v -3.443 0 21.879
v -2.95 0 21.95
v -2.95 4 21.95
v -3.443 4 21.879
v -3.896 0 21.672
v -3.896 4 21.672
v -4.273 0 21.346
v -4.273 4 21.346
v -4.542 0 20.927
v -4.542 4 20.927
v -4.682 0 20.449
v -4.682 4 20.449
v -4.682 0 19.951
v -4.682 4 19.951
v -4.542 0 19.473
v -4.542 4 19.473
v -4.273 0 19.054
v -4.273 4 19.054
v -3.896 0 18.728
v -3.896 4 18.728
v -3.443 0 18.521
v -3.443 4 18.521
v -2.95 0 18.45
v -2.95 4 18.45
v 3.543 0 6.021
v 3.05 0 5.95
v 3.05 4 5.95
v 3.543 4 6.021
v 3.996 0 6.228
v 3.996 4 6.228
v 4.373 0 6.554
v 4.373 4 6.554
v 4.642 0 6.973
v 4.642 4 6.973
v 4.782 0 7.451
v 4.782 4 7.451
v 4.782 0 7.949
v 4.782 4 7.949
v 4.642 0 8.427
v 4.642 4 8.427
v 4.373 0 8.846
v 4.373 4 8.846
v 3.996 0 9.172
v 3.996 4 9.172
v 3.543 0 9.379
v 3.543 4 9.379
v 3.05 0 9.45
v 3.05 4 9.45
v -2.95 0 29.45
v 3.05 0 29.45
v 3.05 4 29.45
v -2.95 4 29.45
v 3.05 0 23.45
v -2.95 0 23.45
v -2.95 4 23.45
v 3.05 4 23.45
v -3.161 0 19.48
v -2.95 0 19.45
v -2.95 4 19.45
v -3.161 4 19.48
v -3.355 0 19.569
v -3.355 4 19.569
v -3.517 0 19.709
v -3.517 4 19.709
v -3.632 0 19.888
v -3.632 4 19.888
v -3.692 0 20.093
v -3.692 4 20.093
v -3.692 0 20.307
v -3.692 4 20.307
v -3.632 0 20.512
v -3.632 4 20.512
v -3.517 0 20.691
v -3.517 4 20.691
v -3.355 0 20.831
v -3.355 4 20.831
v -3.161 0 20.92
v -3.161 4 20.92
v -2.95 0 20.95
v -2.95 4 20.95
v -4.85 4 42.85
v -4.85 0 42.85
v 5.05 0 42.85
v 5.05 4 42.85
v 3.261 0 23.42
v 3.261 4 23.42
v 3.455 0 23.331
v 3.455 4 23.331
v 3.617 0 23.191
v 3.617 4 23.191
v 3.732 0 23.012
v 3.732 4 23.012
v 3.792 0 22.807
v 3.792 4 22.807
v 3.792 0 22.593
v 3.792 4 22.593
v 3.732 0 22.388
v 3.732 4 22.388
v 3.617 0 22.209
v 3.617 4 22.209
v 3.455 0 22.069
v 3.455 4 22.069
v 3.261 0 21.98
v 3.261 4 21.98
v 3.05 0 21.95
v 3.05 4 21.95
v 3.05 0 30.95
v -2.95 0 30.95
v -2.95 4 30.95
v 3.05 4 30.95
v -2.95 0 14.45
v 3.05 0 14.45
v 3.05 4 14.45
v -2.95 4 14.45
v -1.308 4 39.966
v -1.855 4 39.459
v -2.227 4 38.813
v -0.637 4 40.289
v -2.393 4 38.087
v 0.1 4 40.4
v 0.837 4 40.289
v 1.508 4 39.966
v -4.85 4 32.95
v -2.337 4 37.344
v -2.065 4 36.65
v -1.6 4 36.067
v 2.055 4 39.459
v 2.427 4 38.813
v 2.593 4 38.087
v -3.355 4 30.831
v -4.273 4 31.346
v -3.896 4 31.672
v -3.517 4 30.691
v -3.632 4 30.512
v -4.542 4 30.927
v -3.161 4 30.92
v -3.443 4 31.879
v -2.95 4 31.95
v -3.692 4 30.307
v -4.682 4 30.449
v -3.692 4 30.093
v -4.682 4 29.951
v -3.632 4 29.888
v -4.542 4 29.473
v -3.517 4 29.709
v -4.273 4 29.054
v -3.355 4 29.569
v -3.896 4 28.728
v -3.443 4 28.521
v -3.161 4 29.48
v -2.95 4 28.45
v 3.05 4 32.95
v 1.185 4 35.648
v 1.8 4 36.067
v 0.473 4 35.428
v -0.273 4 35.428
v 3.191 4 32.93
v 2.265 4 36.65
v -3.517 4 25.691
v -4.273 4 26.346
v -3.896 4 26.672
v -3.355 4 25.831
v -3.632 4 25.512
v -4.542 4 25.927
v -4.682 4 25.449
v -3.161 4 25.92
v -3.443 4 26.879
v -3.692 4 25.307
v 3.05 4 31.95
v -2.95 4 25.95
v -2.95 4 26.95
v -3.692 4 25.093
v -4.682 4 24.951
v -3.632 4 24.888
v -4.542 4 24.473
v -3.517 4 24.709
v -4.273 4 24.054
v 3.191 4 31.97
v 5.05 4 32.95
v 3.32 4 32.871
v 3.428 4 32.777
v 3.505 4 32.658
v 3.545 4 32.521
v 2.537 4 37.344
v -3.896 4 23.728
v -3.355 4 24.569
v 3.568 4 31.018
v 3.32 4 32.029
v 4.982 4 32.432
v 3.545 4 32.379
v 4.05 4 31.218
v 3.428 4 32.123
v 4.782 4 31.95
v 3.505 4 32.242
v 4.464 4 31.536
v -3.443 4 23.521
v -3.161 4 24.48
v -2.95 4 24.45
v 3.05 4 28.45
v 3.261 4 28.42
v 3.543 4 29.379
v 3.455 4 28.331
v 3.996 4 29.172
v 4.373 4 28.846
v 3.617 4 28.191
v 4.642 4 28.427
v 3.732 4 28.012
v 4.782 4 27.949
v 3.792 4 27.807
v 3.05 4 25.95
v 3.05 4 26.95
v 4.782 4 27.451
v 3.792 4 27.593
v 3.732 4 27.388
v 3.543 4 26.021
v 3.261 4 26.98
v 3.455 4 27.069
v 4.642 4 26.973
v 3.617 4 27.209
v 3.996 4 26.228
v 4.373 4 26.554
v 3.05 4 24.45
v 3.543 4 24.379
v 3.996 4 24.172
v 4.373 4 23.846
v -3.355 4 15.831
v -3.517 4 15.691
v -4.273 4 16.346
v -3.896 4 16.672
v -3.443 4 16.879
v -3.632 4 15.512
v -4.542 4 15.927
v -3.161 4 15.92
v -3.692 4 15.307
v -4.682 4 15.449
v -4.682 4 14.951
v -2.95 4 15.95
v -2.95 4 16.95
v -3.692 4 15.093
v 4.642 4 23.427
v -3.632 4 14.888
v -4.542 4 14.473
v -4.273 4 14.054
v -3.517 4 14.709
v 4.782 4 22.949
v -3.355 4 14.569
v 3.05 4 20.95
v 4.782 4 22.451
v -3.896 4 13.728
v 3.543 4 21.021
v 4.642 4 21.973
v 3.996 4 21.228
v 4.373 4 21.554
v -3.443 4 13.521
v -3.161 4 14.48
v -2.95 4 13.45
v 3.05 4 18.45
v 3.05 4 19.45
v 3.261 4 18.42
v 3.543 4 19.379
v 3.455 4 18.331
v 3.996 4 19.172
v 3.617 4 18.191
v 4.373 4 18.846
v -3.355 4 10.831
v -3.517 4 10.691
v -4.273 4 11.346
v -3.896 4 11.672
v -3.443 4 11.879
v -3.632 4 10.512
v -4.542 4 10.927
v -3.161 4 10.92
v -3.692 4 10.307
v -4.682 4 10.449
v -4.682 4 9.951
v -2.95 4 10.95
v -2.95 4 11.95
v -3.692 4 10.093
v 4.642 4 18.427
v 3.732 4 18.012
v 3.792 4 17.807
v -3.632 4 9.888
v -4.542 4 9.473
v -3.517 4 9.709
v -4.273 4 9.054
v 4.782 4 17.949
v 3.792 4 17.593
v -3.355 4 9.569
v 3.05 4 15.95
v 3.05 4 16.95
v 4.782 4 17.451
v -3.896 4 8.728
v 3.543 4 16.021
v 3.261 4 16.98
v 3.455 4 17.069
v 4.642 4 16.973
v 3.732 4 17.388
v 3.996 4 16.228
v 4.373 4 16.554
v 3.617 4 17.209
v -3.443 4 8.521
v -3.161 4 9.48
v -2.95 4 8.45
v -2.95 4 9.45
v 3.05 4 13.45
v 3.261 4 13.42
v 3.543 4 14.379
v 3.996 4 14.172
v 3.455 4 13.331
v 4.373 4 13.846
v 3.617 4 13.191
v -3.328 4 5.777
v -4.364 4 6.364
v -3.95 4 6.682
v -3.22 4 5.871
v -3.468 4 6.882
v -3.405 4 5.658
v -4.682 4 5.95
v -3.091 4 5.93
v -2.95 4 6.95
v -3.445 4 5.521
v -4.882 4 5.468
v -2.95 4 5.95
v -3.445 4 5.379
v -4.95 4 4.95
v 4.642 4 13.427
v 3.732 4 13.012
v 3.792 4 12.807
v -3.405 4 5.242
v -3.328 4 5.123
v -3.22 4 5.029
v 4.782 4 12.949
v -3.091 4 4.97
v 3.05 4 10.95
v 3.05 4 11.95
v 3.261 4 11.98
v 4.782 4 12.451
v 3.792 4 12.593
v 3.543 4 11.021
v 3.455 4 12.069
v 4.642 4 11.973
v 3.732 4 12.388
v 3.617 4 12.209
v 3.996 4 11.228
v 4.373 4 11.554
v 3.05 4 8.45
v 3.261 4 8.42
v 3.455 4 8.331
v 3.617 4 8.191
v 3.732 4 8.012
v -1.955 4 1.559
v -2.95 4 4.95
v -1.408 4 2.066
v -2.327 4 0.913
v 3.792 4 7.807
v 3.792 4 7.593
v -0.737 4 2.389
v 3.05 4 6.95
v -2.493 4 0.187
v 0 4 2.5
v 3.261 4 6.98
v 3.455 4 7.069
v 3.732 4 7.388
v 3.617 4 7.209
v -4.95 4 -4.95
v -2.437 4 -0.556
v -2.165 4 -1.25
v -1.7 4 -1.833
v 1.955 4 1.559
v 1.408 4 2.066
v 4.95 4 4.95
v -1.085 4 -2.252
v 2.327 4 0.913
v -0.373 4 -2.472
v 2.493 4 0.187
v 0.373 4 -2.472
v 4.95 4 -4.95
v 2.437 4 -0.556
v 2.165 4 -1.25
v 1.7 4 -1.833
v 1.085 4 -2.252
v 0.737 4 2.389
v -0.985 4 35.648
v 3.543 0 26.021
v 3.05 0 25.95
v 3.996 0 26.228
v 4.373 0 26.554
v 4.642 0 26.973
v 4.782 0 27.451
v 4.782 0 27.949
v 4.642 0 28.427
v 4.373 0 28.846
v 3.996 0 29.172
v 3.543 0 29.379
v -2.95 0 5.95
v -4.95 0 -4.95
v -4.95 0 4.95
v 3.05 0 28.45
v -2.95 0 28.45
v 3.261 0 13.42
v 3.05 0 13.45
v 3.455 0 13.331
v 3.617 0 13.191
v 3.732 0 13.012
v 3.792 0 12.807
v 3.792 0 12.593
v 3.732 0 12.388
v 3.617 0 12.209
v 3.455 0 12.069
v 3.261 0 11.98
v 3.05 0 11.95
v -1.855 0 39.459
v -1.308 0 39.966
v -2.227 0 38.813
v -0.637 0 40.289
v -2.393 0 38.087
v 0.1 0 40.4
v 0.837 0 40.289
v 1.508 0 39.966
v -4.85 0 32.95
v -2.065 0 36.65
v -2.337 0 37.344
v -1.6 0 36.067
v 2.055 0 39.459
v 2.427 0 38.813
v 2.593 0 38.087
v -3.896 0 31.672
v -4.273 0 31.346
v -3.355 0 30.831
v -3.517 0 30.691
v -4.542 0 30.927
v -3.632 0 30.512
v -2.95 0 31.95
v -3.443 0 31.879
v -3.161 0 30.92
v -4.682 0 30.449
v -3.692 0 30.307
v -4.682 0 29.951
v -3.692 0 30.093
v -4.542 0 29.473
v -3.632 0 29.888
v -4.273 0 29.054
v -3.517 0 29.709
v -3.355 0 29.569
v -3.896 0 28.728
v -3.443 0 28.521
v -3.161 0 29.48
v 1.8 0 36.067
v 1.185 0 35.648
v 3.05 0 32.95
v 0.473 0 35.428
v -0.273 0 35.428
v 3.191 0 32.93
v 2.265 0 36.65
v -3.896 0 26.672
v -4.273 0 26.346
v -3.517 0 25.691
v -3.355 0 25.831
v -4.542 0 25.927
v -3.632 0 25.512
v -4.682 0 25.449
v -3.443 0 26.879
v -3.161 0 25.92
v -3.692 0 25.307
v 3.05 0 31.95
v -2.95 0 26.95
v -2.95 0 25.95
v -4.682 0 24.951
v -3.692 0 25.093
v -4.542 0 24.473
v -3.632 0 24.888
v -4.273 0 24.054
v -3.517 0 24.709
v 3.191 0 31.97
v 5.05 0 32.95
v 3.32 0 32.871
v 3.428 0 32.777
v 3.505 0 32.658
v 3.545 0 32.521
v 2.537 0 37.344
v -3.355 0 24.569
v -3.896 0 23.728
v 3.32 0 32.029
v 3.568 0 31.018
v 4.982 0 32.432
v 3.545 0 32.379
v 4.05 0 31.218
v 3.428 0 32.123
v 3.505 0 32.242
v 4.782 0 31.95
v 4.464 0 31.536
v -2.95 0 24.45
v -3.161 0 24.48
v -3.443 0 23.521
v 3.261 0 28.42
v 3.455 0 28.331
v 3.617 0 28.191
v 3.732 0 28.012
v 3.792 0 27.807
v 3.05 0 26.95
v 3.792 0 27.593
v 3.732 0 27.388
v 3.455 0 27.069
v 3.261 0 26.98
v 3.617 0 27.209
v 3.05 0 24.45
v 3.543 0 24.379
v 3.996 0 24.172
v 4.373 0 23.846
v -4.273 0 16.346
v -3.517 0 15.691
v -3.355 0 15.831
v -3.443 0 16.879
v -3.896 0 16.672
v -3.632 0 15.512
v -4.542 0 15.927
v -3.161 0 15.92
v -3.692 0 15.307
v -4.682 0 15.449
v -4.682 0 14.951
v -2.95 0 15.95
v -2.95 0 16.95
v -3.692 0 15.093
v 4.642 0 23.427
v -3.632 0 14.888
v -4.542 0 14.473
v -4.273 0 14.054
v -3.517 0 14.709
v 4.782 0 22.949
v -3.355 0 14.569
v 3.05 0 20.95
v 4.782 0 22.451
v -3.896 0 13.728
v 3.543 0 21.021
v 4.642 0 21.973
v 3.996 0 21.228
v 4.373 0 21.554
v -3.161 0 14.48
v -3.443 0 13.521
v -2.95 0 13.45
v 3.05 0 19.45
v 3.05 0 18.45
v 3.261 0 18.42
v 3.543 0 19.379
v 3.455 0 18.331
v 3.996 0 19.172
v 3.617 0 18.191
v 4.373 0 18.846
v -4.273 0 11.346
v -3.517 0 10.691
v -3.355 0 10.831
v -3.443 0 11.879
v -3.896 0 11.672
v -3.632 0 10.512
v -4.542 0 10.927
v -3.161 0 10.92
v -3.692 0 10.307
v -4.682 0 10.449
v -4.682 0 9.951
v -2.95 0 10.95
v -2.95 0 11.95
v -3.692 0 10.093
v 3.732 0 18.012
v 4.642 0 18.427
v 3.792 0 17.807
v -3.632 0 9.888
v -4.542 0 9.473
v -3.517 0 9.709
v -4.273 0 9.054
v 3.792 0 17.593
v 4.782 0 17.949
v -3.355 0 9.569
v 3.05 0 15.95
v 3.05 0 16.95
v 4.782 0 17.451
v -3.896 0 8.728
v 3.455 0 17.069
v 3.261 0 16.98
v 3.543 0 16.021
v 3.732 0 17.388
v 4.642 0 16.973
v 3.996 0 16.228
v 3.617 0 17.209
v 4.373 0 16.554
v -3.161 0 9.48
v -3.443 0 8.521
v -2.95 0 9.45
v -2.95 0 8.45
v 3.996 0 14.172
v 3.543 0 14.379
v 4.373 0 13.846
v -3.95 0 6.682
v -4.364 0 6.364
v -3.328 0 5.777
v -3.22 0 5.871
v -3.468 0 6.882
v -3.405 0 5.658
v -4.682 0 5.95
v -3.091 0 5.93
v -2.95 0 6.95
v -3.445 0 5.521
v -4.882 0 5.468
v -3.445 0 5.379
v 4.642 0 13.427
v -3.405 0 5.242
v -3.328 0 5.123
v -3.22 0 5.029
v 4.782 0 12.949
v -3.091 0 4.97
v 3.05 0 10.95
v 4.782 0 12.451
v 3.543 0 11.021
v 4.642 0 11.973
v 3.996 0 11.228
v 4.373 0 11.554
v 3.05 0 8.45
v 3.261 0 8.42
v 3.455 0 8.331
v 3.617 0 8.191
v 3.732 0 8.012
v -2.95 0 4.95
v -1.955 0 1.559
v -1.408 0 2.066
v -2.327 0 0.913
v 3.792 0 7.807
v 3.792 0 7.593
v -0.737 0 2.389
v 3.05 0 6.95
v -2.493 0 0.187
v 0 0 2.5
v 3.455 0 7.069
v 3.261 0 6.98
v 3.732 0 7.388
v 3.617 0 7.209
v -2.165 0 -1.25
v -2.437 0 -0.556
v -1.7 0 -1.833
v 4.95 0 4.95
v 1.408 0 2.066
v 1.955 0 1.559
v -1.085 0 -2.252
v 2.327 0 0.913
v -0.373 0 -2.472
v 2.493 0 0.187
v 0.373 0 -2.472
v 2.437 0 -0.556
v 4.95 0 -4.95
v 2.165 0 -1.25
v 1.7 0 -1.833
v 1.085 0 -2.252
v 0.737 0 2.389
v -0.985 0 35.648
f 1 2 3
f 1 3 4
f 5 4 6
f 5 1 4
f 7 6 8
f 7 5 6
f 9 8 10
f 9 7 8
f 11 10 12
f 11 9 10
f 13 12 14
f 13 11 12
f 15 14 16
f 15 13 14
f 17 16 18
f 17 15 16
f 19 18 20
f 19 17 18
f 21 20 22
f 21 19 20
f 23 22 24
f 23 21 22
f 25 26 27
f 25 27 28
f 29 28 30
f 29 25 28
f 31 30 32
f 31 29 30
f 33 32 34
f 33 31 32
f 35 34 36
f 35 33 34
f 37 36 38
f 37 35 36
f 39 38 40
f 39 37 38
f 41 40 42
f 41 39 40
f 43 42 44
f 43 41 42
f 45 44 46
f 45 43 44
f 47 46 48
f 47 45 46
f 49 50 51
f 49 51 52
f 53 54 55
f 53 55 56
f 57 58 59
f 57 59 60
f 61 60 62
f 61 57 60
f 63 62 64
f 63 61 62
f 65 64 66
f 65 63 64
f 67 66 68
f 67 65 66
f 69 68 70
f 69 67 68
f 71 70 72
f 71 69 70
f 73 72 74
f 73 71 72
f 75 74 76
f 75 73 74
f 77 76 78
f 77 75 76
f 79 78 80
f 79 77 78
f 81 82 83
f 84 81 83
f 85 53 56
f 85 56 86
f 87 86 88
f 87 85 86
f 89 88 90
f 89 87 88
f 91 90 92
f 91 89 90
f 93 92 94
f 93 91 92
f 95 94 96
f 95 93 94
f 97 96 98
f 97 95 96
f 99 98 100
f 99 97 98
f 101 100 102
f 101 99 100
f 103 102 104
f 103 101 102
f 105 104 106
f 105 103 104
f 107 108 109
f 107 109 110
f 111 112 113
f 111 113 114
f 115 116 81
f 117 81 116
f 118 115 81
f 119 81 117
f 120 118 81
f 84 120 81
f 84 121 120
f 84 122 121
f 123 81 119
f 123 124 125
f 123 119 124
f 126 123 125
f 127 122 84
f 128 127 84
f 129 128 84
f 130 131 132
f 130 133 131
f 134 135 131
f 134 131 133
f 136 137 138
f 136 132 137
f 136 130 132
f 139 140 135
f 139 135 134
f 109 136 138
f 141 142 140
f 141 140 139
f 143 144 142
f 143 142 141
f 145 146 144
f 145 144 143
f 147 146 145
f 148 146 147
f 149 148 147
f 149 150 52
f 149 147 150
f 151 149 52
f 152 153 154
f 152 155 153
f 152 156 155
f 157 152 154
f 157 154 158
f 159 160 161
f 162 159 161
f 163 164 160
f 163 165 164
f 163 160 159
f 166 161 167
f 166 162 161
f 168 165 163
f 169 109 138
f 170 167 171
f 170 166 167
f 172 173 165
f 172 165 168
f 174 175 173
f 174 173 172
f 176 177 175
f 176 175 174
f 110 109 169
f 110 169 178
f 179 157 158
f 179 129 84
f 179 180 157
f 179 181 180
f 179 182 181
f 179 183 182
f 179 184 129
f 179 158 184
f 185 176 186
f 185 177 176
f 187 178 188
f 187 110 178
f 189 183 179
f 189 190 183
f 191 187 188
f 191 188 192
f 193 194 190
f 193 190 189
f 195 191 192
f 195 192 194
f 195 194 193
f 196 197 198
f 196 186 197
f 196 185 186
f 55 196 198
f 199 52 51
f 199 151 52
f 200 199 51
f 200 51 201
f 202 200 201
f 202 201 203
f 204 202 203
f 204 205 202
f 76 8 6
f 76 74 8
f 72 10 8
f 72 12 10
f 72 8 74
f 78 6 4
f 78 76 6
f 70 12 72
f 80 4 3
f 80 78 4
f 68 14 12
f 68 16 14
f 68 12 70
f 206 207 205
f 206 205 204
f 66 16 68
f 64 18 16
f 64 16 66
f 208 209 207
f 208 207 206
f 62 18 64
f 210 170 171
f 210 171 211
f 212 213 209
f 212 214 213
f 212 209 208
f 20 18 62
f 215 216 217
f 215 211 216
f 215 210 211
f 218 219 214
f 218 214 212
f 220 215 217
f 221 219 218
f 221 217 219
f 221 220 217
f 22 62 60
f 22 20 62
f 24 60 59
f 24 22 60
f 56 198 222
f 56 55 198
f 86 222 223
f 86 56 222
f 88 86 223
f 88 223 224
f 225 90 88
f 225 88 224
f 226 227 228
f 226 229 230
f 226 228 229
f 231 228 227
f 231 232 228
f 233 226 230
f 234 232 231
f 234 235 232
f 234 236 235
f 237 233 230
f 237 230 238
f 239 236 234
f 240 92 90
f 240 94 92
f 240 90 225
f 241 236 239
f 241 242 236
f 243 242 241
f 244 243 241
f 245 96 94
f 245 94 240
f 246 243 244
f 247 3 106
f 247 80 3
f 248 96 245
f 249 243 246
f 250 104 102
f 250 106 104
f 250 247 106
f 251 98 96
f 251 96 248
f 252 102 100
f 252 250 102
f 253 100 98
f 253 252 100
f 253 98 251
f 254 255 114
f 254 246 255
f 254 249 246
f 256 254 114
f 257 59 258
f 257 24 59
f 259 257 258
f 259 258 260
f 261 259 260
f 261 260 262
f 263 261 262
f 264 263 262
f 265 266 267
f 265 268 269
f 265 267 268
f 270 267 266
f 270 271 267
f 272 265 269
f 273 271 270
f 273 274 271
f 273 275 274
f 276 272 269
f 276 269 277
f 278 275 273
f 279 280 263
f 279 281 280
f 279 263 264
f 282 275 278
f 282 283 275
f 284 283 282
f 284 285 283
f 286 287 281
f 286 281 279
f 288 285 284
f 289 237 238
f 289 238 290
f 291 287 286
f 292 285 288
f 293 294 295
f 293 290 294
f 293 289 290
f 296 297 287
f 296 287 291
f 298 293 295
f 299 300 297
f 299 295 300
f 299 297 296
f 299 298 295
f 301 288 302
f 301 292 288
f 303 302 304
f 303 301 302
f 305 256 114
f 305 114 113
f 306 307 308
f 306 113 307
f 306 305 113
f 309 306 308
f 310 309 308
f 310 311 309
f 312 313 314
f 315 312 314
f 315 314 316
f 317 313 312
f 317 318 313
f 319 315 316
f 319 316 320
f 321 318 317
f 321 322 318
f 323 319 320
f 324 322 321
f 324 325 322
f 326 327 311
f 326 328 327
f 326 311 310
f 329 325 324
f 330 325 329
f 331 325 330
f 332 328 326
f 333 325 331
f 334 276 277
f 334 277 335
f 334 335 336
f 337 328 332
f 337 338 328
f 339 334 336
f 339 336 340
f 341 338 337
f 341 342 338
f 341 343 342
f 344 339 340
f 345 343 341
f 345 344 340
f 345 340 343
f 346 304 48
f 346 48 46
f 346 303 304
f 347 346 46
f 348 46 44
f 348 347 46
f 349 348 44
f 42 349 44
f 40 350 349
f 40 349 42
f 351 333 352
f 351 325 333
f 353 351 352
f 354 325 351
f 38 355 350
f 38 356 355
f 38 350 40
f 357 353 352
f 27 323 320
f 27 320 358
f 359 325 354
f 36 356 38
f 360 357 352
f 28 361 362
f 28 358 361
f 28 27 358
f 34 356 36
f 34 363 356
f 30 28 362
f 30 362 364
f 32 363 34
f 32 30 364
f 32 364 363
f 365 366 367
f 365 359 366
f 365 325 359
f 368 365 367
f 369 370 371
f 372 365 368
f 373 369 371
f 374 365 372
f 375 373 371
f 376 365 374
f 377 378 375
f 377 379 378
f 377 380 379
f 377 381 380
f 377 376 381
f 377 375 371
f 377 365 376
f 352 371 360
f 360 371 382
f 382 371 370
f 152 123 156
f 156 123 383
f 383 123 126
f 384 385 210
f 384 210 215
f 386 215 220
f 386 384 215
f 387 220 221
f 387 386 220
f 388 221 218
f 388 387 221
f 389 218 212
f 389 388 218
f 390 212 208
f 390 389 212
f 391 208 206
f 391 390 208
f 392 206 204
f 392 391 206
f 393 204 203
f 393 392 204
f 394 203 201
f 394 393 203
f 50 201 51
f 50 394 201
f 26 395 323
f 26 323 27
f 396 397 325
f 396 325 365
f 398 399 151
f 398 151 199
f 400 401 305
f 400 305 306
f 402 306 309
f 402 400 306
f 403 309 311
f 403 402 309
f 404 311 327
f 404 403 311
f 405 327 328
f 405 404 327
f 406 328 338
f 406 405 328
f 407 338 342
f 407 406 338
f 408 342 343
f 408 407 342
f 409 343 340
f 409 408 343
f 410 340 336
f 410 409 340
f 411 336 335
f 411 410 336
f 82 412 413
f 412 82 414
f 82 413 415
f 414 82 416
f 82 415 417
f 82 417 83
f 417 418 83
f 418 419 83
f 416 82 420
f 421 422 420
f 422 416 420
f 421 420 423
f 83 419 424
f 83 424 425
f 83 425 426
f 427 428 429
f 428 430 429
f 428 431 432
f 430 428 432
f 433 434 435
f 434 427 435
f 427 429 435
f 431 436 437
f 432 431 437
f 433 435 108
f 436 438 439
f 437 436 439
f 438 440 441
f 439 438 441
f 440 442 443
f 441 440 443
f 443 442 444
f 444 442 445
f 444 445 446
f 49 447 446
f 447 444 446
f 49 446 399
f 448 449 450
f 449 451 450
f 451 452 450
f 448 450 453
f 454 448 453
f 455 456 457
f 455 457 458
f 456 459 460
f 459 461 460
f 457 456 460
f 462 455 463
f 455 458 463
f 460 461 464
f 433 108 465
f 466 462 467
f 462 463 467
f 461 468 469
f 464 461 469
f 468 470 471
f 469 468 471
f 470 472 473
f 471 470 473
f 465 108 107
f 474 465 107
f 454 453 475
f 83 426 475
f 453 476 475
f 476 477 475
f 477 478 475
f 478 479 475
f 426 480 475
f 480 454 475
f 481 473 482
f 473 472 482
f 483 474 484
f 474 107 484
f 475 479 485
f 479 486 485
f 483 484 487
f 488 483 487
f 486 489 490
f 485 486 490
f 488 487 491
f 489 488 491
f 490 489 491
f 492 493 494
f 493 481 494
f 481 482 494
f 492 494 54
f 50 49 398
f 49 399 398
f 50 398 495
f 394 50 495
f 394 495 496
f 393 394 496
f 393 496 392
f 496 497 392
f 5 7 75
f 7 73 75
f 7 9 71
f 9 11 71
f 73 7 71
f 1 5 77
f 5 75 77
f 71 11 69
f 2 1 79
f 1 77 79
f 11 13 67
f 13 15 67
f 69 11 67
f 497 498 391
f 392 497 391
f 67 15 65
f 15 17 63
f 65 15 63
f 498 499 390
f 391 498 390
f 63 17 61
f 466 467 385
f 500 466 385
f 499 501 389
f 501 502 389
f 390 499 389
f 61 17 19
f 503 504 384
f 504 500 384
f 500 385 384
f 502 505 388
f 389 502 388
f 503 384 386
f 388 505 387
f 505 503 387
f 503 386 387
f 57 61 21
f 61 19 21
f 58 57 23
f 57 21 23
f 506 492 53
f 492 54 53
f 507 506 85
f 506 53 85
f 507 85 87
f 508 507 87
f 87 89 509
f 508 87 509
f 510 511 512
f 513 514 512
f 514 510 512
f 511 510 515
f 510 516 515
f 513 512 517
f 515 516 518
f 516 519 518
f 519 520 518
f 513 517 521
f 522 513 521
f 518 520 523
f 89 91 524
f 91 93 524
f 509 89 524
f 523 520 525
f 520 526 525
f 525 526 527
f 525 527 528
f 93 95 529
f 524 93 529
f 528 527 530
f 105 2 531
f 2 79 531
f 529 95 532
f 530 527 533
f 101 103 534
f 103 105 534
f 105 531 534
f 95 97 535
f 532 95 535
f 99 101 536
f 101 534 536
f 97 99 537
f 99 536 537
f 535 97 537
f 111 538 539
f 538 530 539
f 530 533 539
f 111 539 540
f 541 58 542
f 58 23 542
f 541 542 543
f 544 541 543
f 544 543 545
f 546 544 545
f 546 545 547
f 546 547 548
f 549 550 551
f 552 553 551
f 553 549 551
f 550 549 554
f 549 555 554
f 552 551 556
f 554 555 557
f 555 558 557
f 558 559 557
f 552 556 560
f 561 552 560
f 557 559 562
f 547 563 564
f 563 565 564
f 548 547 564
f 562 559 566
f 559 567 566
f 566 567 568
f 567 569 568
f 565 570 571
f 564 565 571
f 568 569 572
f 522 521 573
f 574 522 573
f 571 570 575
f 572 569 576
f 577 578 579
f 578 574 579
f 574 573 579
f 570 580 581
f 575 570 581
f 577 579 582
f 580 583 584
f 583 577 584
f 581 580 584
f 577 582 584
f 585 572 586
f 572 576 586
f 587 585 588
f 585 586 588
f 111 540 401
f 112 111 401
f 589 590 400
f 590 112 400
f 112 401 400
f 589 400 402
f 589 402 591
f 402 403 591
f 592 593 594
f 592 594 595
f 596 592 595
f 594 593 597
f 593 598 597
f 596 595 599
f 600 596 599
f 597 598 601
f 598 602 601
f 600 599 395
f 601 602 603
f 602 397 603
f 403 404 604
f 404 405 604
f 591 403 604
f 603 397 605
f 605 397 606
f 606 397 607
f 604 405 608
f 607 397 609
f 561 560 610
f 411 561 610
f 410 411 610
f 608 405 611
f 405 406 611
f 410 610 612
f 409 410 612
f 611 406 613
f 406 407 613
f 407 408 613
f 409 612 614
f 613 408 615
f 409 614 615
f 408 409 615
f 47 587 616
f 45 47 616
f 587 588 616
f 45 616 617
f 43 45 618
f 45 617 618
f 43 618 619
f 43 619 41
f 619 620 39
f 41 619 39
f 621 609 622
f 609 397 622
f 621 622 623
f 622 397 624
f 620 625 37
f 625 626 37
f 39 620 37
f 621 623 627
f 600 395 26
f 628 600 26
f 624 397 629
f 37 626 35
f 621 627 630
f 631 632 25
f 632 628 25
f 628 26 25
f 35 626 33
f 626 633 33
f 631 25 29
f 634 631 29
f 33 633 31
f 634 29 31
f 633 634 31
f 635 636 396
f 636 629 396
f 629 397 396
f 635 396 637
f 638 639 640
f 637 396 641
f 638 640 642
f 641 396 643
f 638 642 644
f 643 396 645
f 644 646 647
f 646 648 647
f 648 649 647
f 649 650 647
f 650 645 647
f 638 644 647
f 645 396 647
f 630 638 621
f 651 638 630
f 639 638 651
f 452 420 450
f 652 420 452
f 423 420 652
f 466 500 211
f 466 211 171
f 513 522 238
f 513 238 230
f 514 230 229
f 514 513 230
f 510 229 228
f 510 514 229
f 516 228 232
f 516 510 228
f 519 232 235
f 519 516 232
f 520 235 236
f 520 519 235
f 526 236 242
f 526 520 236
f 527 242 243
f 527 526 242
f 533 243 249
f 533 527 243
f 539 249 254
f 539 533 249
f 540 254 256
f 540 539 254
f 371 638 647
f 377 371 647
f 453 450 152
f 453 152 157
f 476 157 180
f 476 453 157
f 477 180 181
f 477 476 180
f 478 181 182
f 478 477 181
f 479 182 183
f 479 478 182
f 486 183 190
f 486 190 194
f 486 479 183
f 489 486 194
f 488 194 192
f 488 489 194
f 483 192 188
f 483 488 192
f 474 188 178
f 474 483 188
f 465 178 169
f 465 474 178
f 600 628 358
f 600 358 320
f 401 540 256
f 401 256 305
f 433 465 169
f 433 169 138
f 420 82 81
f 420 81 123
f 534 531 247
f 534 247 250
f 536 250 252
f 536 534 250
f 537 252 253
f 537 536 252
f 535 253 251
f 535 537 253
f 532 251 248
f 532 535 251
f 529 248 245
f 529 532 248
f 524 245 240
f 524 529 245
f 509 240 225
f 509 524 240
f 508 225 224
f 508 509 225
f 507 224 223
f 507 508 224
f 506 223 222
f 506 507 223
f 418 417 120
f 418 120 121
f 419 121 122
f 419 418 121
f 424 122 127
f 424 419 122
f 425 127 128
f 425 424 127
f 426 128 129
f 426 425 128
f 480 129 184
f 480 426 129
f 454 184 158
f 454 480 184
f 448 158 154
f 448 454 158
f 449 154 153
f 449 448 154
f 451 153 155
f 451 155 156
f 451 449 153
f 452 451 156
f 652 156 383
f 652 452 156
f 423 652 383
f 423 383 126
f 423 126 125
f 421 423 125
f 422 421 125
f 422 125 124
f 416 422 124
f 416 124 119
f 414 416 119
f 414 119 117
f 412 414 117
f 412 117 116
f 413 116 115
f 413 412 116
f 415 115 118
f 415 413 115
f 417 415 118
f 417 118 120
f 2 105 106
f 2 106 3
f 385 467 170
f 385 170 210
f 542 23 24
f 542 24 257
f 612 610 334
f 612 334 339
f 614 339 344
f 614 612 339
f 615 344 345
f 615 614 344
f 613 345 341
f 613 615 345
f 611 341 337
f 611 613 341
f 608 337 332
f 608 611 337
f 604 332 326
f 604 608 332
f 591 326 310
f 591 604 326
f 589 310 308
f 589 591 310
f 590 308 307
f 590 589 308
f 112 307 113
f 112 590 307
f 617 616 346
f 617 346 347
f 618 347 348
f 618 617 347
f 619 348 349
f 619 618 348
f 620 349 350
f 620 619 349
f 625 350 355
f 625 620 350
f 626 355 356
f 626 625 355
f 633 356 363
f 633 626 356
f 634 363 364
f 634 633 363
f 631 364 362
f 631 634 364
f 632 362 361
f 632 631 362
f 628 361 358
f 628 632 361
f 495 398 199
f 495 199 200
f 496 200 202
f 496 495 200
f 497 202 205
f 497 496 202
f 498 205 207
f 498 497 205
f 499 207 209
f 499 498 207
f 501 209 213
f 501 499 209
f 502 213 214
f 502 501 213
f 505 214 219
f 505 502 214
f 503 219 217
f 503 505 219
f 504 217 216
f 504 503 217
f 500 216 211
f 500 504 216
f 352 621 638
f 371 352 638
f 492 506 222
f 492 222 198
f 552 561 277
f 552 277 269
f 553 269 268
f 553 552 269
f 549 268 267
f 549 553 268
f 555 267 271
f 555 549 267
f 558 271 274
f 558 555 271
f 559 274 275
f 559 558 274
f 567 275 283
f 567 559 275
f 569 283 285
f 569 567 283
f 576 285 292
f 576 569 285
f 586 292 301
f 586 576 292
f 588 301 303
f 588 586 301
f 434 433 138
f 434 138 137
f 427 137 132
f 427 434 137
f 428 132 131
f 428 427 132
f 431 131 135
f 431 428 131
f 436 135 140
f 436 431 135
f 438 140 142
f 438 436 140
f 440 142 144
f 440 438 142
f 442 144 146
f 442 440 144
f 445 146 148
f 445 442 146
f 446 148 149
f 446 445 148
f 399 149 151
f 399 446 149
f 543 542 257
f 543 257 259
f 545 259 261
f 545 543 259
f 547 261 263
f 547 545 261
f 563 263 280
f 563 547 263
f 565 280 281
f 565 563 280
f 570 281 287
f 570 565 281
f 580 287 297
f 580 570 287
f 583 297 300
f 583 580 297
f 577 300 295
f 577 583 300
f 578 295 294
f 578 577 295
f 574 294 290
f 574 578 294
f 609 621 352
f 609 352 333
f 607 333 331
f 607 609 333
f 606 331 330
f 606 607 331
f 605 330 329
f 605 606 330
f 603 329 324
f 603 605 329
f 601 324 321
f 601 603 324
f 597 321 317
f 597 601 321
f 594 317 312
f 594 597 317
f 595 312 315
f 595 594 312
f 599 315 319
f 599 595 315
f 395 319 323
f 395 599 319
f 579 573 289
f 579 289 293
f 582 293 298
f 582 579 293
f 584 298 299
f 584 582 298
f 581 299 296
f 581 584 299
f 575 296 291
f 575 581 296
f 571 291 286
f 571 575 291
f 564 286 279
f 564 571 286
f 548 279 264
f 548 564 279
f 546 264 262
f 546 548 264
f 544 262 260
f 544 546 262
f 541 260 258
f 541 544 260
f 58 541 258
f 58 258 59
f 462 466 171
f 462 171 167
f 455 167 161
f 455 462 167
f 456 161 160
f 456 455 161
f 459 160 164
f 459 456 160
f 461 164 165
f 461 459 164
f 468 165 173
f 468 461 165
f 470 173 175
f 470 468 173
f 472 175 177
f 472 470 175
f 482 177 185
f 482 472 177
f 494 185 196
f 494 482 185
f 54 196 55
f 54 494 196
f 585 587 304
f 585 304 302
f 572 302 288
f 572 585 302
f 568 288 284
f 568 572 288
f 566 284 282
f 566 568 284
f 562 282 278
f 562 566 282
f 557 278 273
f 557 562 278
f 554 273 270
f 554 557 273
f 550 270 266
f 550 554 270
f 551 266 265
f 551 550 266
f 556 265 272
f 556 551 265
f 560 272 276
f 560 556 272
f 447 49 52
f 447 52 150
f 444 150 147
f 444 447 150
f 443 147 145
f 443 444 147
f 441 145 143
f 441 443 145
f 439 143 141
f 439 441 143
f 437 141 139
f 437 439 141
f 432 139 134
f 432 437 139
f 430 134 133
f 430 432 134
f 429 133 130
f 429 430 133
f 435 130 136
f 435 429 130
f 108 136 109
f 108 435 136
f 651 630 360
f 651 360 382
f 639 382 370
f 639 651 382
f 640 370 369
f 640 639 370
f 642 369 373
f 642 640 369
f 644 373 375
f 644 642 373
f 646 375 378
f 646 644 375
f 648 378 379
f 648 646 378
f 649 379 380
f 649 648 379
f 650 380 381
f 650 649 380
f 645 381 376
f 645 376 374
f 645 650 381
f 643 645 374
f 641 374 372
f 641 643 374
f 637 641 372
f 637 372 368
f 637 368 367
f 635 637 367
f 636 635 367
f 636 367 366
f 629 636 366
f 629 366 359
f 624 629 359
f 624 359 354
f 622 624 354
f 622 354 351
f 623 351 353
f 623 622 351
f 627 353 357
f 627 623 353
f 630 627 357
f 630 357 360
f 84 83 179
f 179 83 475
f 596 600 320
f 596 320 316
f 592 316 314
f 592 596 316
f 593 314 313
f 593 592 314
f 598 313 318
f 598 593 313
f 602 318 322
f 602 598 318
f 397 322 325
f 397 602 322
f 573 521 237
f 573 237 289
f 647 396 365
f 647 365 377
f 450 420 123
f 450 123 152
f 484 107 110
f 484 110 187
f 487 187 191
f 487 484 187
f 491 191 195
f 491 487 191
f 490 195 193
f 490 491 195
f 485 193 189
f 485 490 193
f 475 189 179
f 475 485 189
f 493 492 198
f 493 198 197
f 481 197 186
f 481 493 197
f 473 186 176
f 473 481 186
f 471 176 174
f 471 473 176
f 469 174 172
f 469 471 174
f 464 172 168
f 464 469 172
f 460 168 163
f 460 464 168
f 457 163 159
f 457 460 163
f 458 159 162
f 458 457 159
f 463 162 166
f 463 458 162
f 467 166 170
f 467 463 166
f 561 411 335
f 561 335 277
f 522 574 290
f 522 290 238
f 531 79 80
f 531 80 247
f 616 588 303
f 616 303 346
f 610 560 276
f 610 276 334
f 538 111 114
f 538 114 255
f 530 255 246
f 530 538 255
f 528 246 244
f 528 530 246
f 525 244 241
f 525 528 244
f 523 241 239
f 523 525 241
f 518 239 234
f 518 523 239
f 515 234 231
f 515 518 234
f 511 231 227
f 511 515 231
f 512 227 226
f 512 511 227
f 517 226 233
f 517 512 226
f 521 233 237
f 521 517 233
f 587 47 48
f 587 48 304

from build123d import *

# Parameters (mm, degrees)
SKETCH_1_W      = 9.9
SKETCH_1_H      = 9.9
SKETCH_1_R      = 2.5
EXTRUDE_1_DEPTH = 4
EXTRUDE_2_DEPTH = 4
SKETCH_3_W      = 9.9
SKETCH_3_H      = 9.9
SKETCH_3_R      = 2.5
EXTRUDE_3_DEPTH = 4


with BuildPart() as part:
    # 草图1 → 凸台-拉伸1 (new body)
    with BuildSketch(Plane(origin=(0, 0, 0), x_dir=(1, 0, 0), z_dir=(0, 1, 0))):
        Rectangle(SKETCH_1_W, SKETCH_1_H)
        with Locations(Location((0, 0, 0), (0, 0, 270))):
            Circle(SKETCH_1_R, mode=Mode.SUBTRACT)
    extrude(amount=EXTRUDE_1_DEPTH)

    # 草图2 → 凸台-拉伸2 (add)
    with BuildSketch(Plane(origin=(0, 0, 0), x_dir=(1, 0, 0), z_dir=(0, 1, 0))):
        with BuildLine():
            Line((3.05, -6.95), (-2.95, -6.95))
            ThreePointArc((-2.95, -6.95), (-4.364213562, -6.364213562), (-4.95, -4.95))
            Line((-4.95, -4.95), (-2.95, -4.95))
            ThreePointArc((-2.95, -4.95), (-3.45, -5.45), (-2.95, -5.95))
            Line((-2.95, -5.95), (3.05, -5.95))
            ThreePointArc((3.05, -5.95), (4.8, -7.7), (3.05, -9.45))
            Line((3.05, -9.45), (-2.95, -9.45))
            ThreePointArc((-2.95, -9.45), (-3.7, -10.2), (-2.95, -10.95))
            Line((-2.95, -10.95), (3.05, -10.95))
            ThreePointArc((3.05, -10.95), (4.8, -12.7), (3.05, -14.45))
            Line((3.05, -14.45), (-2.95, -14.45))
            ThreePointArc((-2.95, -14.45), (-3.7, -15.2), (-2.95, -15.95))
            Line((-2.95, -15.95), (3.05, -15.95))
            ThreePointArc((3.05, -15.95), (4.8, -17.7), (3.05, -19.45))
            Line((3.05, -19.45), (-2.95, -19.45))
            ThreePointArc((-2.95, -19.45), (-3.7, -20.2), (-2.95, -20.95))
            Line((-2.95, -20.95), (3.05, -20.95))
            ThreePointArc((3.05, -20.95), (4.8, -22.7), (3.05, -24.45))
            Line((3.05, -24.45), (-2.95, -24.45))
            ThreePointArc((-2.95, -24.45), (-3.7, -25.2), (-2.95, -25.95))
            Line((-2.95, -25.95), (3.05, -25.95))
            ThreePointArc((3.05, -25.95), (4.8, -27.7), (3.05, -29.45))
            Line((3.05, -29.45), (-2.95, -29.45))
            ThreePointArc((-2.95, -29.45), (-3.7, -30.2), (-2.95, -30.95))
            Line((-2.95, -30.95), (3.05, -30.95))
            ThreePointArc((3.05, -30.95), (4.464213562, -31.535786438), (5.05, -32.95))
            Line((5.05, -32.95), (3.05, -32.95))
            ThreePointArc((3.05, -32.95), (3.55, -32.45), (3.05, -31.95))
            Line((3.05, -31.95), (-2.95, -31.95))
            ThreePointArc((-2.95, -31.95), (-4.7, -30.2), (-2.95, -28.45))
            Line((-2.95, -28.45), (3.05, -28.45))
            ThreePointArc((3.05, -28.45), (3.8, -27.7), (3.05, -26.95))
            Line((3.05, -26.95), (-2.95, -26.95))
            ThreePointArc((-2.95, -26.95), (-4.7, -25.2), (-2.95, -23.45))
            Line((-2.95, -23.45), (3.05, -23.45))
            ThreePointArc((3.05, -23.45), (3.8, -22.7), (3.05, -21.95))
            Line((3.05, -21.95), (-2.95, -21.95))
            ThreePointArc((-2.95, -21.95), (-4.7, -20.2), (-2.95, -18.45))
            Line((-2.95, -18.45), (3.05, -18.45))
            ThreePointArc((3.05, -18.45), (3.8, -17.7), (3.05, -16.95))
            Line((3.05, -16.95), (-2.95, -16.95))
            ThreePointArc((-2.95, -16.95), (-4.7, -15.2), (-2.95, -13.45))
            Line((-2.95, -13.45), (3.05, -13.45))
            ThreePointArc((3.05, -13.45), (3.8, -12.7), (3.05, -11.95))
            Line((3.05, -11.95), (-2.95, -11.95))
            ThreePointArc((-2.95, -11.95), (-4.7, -10.2), (-2.95, -8.45))
            Line((-2.95, -8.45), (3.05, -8.45))
            ThreePointArc((3.05, -8.45), (3.8, -7.7), (3.05, -6.95))
        make_face()
    extrude(amount=EXTRUDE_2_DEPTH)

    # 草图3 → 凸台-拉伸3 (add)
    with BuildSketch(Plane(origin=(0, 0, 0), x_dir=(1, 0, 0), z_dir=(0, 1, 0))):
        with Locations((0.1, -37.9)):
            Rectangle(SKETCH_3_W, SKETCH_3_H)
        with Locations(Location((0.1, -37.9, 0), (0, 0, 270))):
            Circle(SKETCH_3_R, mode=Mode.SUBTRACT)
    extrude(amount=EXTRUDE_3_DEPTH)


solid = part.part
